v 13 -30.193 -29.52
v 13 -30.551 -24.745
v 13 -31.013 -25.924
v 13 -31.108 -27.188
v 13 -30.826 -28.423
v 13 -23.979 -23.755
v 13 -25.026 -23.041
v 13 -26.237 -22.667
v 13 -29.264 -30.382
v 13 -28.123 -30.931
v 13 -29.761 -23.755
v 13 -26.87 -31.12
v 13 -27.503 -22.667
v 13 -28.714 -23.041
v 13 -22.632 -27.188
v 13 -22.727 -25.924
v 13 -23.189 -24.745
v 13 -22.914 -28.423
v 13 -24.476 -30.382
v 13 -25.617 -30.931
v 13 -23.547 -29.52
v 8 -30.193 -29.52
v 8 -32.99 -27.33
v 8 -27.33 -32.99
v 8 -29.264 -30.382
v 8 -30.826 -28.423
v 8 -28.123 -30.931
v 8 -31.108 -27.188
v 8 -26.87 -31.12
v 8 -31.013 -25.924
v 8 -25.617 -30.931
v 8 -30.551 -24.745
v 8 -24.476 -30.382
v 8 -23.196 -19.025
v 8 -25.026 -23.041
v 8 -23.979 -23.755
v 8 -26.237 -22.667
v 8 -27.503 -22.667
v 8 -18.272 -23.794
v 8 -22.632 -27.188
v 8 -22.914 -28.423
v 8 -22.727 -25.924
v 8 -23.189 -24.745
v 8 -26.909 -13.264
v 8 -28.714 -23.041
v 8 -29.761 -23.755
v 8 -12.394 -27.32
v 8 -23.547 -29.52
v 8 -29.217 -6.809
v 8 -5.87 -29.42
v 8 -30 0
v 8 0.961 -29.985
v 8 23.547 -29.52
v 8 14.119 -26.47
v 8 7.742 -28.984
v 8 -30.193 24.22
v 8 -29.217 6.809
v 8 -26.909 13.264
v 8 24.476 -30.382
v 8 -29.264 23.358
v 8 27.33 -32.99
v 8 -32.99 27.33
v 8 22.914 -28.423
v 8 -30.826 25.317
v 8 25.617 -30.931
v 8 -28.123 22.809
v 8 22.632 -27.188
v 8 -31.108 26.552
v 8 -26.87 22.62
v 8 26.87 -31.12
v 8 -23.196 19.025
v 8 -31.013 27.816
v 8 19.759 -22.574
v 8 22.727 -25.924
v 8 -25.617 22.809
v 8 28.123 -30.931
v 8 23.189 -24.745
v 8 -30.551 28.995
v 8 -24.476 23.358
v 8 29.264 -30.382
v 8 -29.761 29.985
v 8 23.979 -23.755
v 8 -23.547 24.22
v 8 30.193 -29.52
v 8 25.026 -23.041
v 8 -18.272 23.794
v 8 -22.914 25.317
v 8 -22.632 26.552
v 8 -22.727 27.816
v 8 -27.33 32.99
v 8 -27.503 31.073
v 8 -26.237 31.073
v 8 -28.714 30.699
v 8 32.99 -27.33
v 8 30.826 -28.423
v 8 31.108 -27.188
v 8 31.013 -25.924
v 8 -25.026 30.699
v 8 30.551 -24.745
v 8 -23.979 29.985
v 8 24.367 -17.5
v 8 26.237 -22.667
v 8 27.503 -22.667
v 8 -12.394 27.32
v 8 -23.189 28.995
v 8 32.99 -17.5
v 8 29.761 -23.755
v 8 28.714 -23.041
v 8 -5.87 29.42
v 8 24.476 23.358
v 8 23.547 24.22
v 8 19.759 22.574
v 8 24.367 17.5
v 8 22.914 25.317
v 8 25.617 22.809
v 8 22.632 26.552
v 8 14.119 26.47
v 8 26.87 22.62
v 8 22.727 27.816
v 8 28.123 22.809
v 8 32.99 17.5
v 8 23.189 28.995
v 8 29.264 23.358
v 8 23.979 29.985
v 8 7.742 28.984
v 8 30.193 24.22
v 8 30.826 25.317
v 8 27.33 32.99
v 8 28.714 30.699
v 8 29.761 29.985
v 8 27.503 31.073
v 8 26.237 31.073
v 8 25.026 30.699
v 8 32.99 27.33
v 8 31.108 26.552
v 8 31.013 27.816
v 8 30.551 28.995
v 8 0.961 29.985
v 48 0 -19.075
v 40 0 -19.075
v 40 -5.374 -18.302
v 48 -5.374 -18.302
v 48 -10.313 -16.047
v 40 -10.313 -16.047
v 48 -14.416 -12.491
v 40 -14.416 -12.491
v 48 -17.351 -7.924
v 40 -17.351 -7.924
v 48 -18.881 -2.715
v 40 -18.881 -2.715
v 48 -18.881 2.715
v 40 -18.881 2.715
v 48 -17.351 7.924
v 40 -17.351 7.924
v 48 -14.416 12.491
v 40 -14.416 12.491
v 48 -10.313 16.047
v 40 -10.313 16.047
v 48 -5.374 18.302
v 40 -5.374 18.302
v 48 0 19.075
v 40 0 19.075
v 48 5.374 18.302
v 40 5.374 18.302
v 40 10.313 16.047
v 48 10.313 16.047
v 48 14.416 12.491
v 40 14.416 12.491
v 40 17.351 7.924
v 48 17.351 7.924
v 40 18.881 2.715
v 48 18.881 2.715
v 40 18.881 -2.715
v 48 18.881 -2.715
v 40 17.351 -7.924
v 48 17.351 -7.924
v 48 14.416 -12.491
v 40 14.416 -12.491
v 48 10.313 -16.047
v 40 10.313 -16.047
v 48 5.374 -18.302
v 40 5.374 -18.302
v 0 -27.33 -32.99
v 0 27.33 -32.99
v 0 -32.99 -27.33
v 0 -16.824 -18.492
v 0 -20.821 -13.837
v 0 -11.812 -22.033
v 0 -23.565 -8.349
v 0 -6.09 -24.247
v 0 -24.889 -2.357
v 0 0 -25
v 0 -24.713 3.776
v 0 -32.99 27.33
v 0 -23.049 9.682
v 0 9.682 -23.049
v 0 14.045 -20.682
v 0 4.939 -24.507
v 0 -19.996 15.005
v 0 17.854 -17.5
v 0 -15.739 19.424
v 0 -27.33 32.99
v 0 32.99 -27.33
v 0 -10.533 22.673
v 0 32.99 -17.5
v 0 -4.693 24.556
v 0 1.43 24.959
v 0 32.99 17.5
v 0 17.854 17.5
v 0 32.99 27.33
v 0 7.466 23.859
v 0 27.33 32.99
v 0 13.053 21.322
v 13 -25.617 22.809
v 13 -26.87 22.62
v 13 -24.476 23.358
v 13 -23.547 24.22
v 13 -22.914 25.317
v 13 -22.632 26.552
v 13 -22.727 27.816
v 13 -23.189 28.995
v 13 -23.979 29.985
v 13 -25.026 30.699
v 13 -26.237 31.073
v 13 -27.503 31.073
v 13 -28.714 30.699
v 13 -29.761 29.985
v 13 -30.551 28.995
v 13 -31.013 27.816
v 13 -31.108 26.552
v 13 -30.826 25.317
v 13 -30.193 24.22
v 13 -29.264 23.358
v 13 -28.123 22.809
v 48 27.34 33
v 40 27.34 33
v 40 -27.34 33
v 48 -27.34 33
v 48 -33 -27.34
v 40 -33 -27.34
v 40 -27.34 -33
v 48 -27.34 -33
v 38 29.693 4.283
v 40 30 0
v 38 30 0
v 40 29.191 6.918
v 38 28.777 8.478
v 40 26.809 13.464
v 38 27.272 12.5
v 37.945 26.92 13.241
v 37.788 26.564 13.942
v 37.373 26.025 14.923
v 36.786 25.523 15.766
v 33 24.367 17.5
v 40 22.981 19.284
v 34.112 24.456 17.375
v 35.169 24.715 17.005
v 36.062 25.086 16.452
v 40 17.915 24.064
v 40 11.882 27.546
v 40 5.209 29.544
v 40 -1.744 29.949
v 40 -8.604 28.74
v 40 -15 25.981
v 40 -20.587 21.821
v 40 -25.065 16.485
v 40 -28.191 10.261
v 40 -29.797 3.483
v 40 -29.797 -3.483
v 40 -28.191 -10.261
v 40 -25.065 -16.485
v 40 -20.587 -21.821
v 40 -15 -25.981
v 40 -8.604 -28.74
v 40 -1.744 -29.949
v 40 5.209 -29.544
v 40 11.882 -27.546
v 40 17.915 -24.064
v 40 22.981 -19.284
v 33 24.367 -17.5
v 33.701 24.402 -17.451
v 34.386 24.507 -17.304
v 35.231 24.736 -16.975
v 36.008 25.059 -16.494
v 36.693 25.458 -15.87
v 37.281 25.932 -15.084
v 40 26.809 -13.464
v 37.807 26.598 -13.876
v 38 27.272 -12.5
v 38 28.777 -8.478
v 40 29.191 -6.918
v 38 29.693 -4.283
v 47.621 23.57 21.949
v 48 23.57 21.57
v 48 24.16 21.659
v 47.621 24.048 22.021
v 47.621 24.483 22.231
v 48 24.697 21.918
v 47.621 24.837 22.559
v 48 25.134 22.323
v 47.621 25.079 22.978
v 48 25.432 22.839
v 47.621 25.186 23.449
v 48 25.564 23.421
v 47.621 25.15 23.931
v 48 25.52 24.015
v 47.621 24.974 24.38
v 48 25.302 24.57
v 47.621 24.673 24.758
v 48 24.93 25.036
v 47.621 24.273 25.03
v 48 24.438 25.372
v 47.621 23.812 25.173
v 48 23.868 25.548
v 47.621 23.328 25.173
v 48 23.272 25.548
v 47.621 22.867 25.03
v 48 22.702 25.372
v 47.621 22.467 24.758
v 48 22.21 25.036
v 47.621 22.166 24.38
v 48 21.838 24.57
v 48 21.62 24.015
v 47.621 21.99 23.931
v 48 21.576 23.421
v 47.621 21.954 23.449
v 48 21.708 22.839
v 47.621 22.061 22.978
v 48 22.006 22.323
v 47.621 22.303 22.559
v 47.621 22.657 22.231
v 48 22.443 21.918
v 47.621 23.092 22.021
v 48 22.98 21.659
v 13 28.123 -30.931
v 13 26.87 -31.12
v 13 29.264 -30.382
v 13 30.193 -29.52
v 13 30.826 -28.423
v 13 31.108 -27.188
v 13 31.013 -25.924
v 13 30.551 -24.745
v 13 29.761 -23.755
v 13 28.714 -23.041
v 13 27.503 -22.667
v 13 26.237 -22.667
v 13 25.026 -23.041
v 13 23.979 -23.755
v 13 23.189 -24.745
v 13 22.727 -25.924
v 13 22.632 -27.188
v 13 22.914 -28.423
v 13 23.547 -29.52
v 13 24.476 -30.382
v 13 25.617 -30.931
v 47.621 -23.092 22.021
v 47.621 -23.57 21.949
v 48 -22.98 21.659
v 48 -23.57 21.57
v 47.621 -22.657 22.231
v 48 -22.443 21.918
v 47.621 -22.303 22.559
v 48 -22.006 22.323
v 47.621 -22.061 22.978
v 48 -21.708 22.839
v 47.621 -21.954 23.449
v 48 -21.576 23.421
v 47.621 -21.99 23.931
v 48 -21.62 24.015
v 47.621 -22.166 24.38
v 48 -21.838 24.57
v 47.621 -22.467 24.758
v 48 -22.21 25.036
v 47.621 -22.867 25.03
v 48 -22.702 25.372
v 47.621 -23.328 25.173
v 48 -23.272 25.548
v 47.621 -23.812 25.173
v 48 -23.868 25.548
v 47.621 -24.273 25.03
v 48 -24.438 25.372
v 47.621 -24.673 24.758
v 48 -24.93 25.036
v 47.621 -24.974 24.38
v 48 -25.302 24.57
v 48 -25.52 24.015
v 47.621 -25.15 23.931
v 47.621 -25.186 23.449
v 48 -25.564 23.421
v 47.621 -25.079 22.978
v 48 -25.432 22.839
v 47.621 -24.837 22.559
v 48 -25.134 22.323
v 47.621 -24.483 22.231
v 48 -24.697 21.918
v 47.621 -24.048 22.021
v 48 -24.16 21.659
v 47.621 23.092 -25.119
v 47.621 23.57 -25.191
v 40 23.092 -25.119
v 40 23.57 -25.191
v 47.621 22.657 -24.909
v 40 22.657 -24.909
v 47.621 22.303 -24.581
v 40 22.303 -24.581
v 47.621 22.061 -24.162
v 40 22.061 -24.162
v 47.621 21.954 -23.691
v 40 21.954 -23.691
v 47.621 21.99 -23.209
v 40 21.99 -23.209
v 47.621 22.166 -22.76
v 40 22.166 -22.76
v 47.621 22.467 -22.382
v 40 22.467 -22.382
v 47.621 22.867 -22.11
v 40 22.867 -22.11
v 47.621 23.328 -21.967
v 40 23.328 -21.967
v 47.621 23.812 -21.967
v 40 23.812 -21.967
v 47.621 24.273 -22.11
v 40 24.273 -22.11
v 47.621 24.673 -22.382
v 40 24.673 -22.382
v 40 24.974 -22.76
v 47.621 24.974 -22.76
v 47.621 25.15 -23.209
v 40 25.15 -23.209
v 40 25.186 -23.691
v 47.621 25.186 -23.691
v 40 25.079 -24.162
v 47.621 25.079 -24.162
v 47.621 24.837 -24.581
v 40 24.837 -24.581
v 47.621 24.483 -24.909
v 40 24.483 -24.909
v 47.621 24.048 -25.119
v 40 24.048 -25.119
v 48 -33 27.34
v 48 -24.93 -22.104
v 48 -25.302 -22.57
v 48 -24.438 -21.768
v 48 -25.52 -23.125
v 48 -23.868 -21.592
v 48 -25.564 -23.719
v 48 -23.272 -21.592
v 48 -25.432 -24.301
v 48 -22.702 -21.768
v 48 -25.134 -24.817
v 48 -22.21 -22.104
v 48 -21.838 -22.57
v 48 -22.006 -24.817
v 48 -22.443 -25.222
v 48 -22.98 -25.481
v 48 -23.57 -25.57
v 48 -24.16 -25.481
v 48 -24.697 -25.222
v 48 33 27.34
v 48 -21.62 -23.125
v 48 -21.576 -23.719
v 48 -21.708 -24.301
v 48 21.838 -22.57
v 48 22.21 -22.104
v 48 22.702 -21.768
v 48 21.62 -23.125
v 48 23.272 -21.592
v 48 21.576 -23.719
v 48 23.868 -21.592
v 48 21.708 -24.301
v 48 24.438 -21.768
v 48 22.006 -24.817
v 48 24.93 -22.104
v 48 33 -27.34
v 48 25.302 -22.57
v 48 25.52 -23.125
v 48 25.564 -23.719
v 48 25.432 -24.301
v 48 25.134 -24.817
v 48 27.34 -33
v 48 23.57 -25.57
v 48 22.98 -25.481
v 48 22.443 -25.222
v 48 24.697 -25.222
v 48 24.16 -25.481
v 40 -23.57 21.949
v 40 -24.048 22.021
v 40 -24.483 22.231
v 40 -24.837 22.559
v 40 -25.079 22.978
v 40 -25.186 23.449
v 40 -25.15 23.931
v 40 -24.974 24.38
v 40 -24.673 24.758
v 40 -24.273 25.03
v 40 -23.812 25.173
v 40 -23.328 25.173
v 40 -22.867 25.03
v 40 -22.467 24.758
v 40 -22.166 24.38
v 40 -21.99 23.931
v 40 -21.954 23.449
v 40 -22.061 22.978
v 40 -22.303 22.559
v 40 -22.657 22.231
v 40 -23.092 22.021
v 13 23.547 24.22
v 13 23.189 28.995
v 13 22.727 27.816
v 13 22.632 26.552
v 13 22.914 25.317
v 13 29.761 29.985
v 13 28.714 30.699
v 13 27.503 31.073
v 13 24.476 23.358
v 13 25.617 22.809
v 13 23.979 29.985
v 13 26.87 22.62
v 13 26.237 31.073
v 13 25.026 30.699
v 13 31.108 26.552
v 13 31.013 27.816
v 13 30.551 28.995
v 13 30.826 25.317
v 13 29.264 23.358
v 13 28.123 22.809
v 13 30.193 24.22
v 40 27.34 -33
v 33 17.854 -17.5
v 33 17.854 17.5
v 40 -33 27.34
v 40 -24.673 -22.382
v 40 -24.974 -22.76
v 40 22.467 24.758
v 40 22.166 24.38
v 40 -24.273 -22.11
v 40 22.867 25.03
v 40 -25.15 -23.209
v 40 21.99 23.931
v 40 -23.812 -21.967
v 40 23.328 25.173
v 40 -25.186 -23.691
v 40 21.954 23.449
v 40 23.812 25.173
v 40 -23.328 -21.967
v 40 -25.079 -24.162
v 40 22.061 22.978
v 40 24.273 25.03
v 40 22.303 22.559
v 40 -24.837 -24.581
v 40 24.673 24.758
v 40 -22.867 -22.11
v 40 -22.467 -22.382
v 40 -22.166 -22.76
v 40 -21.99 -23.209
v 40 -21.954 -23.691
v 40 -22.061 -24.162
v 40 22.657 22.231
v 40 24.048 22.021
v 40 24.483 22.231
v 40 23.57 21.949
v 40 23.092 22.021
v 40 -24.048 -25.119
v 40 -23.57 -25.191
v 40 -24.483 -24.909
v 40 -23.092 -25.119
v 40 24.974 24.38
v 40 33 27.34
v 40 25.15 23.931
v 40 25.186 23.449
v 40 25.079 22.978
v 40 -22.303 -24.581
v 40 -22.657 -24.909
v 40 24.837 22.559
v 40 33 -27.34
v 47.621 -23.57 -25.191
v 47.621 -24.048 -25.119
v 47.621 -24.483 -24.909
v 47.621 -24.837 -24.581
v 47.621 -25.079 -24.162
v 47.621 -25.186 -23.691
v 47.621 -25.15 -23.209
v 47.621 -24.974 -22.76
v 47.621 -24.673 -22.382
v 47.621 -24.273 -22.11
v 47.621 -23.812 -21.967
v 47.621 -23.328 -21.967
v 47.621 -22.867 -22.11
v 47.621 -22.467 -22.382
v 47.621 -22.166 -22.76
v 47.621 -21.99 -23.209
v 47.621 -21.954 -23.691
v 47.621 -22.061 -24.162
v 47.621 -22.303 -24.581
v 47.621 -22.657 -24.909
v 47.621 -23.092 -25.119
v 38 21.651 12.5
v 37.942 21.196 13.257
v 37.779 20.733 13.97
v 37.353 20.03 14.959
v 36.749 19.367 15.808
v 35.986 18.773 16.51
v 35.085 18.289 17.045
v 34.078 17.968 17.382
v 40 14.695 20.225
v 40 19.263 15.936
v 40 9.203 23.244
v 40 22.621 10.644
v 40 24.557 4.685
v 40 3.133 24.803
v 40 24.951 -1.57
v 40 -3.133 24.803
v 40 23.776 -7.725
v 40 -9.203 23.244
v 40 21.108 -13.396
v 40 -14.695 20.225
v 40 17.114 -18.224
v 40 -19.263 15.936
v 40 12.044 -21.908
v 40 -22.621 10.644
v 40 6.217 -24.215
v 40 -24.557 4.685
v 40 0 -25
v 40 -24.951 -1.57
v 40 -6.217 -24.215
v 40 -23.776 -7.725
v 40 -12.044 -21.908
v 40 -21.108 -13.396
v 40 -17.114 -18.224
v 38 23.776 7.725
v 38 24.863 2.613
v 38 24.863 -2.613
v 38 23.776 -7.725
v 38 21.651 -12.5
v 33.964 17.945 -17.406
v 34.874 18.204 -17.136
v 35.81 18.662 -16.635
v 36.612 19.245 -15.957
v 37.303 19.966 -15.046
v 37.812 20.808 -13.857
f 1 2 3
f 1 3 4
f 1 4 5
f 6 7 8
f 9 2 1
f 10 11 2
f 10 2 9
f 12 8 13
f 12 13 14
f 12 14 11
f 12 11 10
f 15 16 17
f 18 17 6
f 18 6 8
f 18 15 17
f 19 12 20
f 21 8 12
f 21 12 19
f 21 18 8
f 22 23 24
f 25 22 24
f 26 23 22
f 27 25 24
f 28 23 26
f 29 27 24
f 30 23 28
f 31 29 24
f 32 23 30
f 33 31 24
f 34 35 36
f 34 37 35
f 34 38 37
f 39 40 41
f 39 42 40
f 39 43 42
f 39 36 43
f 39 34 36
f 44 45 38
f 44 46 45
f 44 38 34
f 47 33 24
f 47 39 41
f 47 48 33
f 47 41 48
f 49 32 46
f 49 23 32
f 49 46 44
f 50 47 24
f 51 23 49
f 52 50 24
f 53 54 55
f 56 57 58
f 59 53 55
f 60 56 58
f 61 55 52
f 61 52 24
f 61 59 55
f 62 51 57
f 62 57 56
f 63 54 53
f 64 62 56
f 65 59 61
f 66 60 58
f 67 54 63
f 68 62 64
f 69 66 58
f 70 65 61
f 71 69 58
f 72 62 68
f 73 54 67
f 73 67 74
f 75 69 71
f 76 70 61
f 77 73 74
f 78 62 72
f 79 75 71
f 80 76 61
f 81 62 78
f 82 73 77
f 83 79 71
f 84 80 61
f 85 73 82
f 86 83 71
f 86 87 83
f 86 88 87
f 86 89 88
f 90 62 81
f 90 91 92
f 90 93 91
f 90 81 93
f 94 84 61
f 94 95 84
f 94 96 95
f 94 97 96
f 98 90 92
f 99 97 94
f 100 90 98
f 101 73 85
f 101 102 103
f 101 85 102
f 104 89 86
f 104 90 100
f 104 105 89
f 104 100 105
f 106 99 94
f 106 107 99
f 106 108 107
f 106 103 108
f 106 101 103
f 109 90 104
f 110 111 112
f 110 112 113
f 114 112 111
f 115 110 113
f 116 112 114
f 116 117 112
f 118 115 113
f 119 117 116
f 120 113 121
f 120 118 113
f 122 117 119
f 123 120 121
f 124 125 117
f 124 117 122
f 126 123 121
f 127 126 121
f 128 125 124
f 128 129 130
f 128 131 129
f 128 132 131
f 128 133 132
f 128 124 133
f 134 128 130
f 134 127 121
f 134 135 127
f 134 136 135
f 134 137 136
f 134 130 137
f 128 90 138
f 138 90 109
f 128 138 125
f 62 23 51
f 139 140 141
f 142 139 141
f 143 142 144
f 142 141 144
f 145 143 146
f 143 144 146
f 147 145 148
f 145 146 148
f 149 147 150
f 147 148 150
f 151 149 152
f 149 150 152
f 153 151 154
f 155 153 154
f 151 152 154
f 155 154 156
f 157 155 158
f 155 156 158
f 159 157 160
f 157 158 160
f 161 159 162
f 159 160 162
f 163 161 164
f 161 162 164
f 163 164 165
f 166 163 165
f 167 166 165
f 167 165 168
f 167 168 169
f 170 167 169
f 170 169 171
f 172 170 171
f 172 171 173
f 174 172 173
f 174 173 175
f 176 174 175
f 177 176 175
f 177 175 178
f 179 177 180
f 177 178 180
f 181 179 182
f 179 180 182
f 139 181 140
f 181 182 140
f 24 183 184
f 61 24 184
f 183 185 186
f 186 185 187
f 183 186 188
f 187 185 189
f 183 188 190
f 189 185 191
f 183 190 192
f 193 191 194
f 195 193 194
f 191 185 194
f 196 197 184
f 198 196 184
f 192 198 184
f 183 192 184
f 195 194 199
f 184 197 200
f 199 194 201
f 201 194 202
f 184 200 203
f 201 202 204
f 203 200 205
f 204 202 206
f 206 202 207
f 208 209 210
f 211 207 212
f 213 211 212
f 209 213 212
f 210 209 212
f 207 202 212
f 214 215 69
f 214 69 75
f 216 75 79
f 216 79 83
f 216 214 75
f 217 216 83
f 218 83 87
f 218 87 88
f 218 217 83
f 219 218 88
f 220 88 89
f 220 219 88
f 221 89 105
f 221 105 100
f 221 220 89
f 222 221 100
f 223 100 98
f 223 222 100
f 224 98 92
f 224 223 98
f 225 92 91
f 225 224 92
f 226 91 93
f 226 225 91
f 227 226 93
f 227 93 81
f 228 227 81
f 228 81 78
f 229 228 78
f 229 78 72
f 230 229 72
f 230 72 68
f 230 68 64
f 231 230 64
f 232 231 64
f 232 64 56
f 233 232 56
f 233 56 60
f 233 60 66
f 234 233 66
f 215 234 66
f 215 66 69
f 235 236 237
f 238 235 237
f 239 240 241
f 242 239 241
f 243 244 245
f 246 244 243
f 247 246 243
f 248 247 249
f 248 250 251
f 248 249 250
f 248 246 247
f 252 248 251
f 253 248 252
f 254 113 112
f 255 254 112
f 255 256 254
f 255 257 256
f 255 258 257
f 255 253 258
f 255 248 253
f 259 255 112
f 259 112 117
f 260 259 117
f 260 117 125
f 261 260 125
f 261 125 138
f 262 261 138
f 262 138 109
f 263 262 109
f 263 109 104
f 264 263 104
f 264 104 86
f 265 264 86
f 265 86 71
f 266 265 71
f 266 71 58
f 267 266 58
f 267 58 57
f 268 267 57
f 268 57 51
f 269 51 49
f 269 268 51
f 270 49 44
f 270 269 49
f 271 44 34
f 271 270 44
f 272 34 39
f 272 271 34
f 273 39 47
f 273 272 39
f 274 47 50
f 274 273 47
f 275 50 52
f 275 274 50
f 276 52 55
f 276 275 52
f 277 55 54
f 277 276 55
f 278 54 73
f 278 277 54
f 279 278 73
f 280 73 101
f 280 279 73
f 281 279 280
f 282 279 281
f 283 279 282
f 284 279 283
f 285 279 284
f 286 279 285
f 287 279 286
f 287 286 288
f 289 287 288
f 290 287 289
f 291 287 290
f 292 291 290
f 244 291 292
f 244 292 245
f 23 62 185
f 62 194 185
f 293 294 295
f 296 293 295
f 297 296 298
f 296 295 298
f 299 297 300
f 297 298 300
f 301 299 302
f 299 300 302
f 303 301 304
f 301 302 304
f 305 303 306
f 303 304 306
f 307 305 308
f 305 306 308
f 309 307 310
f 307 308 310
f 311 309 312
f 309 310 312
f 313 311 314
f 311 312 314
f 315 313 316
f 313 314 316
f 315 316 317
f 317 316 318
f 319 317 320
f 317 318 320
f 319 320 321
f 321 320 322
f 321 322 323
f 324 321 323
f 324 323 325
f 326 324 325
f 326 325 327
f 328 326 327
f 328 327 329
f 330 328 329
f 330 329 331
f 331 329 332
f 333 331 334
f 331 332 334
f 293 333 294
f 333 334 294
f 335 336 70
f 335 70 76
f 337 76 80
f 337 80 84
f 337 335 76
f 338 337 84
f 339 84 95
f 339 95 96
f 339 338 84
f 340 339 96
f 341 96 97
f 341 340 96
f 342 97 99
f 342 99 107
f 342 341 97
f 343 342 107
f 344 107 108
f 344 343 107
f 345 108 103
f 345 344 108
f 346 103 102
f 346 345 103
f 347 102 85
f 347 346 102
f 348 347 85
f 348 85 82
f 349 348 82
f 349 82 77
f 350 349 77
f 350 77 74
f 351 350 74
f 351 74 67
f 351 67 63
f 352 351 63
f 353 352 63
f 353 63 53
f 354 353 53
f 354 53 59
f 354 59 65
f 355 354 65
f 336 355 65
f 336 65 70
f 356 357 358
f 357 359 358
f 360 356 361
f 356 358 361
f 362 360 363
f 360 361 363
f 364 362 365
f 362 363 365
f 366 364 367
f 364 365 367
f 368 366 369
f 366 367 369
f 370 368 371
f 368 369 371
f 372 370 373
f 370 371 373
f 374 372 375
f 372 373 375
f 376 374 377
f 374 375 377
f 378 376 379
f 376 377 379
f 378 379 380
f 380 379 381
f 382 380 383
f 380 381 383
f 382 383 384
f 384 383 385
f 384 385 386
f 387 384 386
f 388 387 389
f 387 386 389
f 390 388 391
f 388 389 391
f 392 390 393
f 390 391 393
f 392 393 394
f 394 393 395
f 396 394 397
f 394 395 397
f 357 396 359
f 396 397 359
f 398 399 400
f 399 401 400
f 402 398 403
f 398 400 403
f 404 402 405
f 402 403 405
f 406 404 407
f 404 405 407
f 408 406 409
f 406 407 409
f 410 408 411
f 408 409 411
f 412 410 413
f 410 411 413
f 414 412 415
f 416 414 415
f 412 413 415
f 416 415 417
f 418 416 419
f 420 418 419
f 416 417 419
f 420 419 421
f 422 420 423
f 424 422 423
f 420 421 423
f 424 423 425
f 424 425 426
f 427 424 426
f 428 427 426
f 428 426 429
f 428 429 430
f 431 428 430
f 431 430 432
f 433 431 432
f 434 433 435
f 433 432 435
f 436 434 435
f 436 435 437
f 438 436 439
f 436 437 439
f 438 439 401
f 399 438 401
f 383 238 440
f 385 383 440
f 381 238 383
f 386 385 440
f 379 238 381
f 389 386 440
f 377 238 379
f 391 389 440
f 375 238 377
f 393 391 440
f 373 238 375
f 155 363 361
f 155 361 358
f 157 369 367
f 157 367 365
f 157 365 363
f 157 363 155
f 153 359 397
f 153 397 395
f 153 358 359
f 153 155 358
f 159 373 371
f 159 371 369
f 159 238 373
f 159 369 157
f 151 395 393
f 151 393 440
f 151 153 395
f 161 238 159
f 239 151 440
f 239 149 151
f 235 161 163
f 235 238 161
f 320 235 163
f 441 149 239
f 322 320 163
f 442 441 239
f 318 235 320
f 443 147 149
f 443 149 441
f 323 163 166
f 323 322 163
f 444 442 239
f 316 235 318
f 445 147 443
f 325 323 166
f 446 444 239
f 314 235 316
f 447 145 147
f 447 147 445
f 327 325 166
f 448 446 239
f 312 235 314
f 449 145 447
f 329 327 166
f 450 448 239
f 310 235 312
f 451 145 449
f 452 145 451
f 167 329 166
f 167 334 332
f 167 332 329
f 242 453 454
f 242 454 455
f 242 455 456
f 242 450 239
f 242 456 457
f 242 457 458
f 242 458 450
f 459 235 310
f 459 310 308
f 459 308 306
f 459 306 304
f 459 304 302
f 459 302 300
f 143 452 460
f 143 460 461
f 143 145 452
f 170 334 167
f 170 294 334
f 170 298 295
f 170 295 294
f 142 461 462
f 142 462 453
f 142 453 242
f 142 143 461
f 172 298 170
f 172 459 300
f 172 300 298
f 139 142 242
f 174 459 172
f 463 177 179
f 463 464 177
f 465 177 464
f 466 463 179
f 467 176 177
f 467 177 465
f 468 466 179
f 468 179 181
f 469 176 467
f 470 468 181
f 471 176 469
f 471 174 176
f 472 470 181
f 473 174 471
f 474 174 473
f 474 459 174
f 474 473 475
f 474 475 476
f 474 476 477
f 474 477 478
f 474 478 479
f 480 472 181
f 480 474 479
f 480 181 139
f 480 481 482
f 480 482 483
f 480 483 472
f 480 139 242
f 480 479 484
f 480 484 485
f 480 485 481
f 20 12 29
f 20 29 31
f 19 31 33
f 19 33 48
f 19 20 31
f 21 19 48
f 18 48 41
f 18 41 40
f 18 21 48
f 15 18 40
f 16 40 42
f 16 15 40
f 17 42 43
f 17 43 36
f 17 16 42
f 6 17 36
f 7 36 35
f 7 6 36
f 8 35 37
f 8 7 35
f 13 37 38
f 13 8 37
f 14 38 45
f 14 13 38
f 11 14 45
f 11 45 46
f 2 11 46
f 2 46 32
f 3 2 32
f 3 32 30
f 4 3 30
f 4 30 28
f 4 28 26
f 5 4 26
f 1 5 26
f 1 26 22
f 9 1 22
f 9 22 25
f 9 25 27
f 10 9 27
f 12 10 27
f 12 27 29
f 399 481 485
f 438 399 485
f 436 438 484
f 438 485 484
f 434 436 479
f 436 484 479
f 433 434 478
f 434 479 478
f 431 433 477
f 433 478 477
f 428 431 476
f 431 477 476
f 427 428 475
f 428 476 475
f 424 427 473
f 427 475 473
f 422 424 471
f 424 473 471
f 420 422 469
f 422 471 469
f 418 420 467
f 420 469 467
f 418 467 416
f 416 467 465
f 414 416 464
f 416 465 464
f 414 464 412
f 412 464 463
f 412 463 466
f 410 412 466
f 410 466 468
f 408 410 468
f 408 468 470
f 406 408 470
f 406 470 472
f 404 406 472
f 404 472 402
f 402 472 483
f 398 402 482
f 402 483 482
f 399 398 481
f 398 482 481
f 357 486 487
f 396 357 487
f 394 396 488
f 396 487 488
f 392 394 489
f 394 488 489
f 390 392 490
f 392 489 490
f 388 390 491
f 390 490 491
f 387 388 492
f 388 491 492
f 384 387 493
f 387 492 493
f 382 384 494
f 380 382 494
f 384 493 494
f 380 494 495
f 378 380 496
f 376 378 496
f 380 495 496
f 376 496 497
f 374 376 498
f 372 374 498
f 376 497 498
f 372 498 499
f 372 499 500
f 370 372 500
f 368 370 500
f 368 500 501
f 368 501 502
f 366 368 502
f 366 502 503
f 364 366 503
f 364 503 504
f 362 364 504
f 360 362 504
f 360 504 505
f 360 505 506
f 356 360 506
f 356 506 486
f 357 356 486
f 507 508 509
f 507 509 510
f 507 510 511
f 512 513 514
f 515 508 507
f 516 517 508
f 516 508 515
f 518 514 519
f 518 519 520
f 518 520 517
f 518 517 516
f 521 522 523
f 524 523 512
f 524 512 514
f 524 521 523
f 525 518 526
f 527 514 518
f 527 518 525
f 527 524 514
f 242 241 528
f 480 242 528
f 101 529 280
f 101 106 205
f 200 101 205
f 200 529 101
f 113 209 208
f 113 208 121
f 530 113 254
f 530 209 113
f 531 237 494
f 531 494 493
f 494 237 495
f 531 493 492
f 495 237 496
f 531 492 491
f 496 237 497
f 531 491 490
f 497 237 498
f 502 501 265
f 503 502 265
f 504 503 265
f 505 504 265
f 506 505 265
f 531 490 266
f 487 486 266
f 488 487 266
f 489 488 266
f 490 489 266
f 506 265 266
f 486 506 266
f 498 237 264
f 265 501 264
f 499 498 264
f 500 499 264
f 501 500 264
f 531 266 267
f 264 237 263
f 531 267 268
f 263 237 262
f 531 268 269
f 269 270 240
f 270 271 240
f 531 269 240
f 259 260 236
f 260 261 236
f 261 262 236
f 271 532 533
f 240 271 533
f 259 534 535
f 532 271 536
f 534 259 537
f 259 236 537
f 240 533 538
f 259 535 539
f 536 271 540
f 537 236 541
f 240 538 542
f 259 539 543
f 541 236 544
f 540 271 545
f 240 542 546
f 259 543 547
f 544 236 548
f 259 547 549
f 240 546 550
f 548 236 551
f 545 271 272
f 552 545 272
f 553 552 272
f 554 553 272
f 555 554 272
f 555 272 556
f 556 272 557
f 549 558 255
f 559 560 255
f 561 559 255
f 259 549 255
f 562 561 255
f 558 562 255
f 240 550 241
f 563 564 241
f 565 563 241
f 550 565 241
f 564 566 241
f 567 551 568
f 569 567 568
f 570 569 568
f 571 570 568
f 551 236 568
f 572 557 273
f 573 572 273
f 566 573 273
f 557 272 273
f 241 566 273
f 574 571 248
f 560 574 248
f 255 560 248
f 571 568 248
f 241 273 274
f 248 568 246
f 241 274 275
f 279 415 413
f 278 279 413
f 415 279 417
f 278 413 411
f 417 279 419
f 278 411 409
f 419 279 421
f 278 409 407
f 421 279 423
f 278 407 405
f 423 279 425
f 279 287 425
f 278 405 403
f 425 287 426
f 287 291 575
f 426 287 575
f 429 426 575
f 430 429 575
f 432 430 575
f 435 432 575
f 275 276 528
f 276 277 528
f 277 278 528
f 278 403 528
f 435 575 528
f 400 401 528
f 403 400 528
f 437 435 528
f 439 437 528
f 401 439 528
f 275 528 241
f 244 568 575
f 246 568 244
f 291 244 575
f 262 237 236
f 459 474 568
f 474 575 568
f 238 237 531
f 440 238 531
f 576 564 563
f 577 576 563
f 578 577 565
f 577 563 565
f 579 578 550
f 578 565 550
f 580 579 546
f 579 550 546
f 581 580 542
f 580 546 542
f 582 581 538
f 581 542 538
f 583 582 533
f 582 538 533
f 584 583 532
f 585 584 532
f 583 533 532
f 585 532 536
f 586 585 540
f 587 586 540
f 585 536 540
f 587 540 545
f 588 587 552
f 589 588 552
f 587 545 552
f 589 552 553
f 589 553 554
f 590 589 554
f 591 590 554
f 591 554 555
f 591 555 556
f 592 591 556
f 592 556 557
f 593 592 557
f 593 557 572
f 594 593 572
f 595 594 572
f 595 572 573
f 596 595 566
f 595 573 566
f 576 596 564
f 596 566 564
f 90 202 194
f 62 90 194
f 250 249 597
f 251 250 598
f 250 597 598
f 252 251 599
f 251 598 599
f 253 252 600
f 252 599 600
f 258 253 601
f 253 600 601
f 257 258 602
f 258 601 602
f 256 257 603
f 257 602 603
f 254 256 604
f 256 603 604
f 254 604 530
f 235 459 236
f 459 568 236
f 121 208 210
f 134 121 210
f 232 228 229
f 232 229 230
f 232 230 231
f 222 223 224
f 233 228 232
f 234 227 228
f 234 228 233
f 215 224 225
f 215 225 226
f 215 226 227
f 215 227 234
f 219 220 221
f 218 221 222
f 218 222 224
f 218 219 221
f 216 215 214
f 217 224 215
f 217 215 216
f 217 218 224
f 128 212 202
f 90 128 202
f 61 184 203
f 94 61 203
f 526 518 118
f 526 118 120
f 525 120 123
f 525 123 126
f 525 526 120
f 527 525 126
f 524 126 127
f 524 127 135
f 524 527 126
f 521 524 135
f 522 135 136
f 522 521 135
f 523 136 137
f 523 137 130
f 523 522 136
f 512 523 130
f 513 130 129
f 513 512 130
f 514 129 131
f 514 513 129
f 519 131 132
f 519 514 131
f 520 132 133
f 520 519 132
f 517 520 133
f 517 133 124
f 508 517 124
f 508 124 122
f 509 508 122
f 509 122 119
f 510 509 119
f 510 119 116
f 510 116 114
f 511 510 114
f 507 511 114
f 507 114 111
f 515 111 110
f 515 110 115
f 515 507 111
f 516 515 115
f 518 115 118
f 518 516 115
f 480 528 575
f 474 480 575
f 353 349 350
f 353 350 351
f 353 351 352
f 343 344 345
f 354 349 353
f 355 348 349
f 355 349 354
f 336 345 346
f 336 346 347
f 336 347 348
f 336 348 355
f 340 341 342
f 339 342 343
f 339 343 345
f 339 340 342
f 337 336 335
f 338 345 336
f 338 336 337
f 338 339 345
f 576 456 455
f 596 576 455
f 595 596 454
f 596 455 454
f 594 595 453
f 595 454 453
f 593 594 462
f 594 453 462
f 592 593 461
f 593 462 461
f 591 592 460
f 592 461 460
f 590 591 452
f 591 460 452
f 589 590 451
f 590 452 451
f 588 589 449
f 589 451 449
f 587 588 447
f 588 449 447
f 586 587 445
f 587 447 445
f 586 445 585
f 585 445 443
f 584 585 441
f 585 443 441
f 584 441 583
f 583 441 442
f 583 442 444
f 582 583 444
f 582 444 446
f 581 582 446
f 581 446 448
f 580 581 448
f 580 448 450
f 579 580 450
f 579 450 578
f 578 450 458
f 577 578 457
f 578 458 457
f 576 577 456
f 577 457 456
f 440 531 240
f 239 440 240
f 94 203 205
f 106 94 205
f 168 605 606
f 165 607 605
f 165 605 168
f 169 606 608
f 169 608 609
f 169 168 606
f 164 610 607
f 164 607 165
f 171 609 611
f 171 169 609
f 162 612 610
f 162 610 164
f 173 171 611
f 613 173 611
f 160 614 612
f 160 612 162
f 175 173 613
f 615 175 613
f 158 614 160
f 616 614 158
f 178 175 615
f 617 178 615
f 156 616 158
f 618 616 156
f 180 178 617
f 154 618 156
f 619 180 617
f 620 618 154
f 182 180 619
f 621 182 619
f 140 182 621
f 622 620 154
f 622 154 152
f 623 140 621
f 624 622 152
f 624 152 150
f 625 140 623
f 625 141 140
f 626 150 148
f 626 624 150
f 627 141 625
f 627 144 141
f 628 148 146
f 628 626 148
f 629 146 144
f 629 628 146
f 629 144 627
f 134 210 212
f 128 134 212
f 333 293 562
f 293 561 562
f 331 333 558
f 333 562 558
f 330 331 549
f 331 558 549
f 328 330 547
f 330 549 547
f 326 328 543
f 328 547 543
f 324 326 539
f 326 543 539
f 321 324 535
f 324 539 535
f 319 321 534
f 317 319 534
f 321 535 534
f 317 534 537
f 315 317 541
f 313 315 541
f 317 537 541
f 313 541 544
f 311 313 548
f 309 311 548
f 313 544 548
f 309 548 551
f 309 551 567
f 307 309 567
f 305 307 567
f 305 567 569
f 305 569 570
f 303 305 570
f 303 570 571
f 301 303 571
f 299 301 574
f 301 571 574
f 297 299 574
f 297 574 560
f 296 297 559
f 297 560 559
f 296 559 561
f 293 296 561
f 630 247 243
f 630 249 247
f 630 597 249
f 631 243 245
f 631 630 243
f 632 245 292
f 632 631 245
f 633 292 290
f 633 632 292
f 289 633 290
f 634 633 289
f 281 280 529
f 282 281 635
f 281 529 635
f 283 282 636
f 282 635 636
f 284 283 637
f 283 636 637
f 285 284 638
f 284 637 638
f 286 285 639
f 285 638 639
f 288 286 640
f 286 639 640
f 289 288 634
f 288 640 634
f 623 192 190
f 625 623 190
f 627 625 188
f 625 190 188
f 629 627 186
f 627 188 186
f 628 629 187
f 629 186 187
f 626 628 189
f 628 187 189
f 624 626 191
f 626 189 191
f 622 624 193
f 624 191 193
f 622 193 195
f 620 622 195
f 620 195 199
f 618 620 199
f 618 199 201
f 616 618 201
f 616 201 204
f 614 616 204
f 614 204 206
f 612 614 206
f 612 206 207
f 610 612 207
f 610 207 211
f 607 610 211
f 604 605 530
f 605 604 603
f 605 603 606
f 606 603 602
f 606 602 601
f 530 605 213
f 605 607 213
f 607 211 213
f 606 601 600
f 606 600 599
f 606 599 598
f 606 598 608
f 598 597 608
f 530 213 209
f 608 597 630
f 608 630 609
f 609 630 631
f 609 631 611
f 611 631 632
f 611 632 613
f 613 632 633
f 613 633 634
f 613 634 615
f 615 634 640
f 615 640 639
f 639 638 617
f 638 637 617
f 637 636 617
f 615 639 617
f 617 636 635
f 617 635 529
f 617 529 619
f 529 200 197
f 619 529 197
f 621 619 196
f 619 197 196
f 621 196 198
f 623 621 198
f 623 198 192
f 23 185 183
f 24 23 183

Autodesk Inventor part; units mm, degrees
sketch "Sketch_1" plane through (0, 0, 0) normal (1, 0, 0) x (0, 1, 0)
  line L0 (27.33, 32.99) -> (-27.33, 32.99)
  line L1 (-27.33, 32.99) -> (-32.99, 27.33)
  line L2 (-32.99, 27.33) -> (-32.99, -27.33)
  line L3 (-32.99, -27.33) -> (-27.33, -32.99)
  line L4 (-27.33, -32.99) -> (27.33, -32.99)
  line L5 (27.33, -32.99) -> (32.99, -27.33)
  line L6 (32.99, -27.33) -> (32.99, 27.33)
  line L7 (32.99, 27.33) -> (27.33, 32.99)
extrude "Extrusion1" add sketch "Sketch_1" along normal blind 8
sketch "Sketch_2" plane through (0, 0, 0) normal (0, 0, 1) x (1, 0, 0)
  line L0 (40, 0) -> (8, 0)
  line L1 (8, 0) -> (8, 30)
  line L2 (8, 30) -> (40, 30)
  line L3 (40, 30) -> (40, 0)
  line L4 (40, 0) -> (8, 0)
revolve "Revolution1" add sketch "Sketch_2" angle 360 about axis through (40, 0, 0) along (1, 0, 0)
sketch "Sketch_3" plane through (40, 0, 0) normal (1, 0, 0) x (0, 0, -1)
  line L0 (-33, 27.34) -> (-33, -27.34)
  line L1 (-33, -27.34) -> (-27.34, -33)
  line L2 (-27.34, -33) -> (27.34, -33)
  line L3 (27.34, -33) -> (33, -27.34)
  line L4 (33, -27.34) -> (33, 27.34)
  line L5 (33, 27.34) -> (27.34, 33)
  line L6 (27.34, 33) -> (-27.34, 33)
  line L7 (-27.34, 33) -> (-33, 27.34)
extrude "Extrusion2" add sketch "Sketch_3" along normal blind 8
sketch "Sketch4" plane through (48, 0, 0) normal (1, 0, 0) x (0, 0, -1)
  point P0 (0, 0)
hole "Drilling 1" at (48, 0, 0) direction (-1, 0, 0) diameter 38.15 depth 8
sketch "Sketch5" plane through (40, 0, 0) normal (1, 0, 0) x (0, 0, -1)
  point P0 (0, 0)
hole "Drilling 2" at (40, 0, 0) direction (-1, 0, 0) diameter 50 depth 40
sketch "Sketch_7" plane through (0, 26.87, 0) normal (0, 1, 0) x (1, 0, 0)
  line L0 (13, 26.87) -> (8, 26.87)
  line L1 (8, 26.87) -> (8, 31.12)
  line L2 (8, 31.12) -> (13, 31.12)
  line L3 (13, 31.12) -> (13, 26.87)
  line L4 (13, 26.87) -> (8, 26.87)
revolve "Revolution2" add sketch "Sketch_7" angle 360 about axis through (13, 26.87, -26.87) along (1, 0, 0)
sketch "Sketch_8" plane through (0, 26.87, 0) normal (0, 1, 0) x (1, 0, 0)
  line L0 (13, -26.87) -> (8, -26.87)
  line L1 (8, -26.87) -> (8, -22.62)
  line L2 (8, -22.62) -> (13, -22.62)
  line L3 (13, -22.62) -> (13, -26.87)
  line L4 (13, -26.87) -> (8, -26.87)
revolve "Revolution3" add sketch "Sketch_8" angle 360 about axis through (13, 26.87, 26.87) along (1, 0, 0)
sketch "Sketch8" plane through (48, 0, 0) normal (1, 0, 0) x (0, 0, -1)
  point P0 (-23.57, 23.57)
hole "Drilling 3" at (48, 23.57, 23.57) direction (-1, 0, 0) diameter 3.242 depth 8 countersink diameter 4 countersink angle 90 thread size "M4x0.7" class "6H" standard "ISO Metric profile"
sketch "Sketch9" plane through (48, 0, 0) normal (1, 0, 0) x (0, 0, -1)
  point P0 (-23.57, -23.57)
hole "Drilling 4" at (48, -23.57, 23.57) direction (-1, 0, 0) diameter 3.242 depth 8 countersink diameter 4 countersink angle 90 thread size "M4x0.7" class "6H" standard "ISO Metric profile"
sketch "Sketch10" plane through (48, 0, 0) normal (1, 0, 0) x (0, 0, -1)
  point P0 (23.57, 23.57)
hole "Drilling 5" at (48, 23.57, -23.57) direction (-1, 0, 0) diameter 3.242 depth 8 countersink diameter 4 countersink angle 90 thread size "M4x0.7" class "6H" standard "ISO Metric profile"
sketch "Sketch11" plane through (48, 0, 0) normal (1, 0, 0) x (0, 0, -1)
  point P0 (23.57, -23.57)
hole "Drilling 6" at (48, -23.57, -23.57) direction (-1, 0, 0) diameter 3.242 depth 8 countersink diameter 4 countersink angle 90 thread size "M4x0.7" class "6H" standard "ISO Metric profile"
sketch "Sketch_9" plane through (0, -26.87, 0) normal (0, 1, 0) x (1, 0, 0)
  line L0 (13, 26.87) -> (8, 26.87)
  line L1 (8, 26.87) -> (8, 31.12)
  line L2 (8, 31.12) -> (13, 31.12)
  line L3 (13, 31.12) -> (13, 26.87)
  line L4 (13, 26.87) -> (8, 26.87)
revolve "Revolution4" add sketch "Sketch_9" angle 360 about axis through (13, -26.87, -26.87) along (1, 0, 0)
sketch "Sketch_10" plane through (0, -26.87, 0) normal (0, 1, 0) x (1, 0, 0)
  line L0 (13, -26.87) -> (8, -26.87)
  line L1 (8, -26.87) -> (8, -22.62)
  line L2 (8, -22.62) -> (13, -22.62)
  line L3 (13, -22.62) -> (13, -26.87)
  line L4 (13, -26.87) -> (8, -26.87)
revolve "Revolution5" add sketch "Sketch_10" angle 360 about axis through (13, -26.87, 26.87) along (1, 0, 0)
sketch "Sketch_33" plane through (0, 0, 0) normal (0, 1, 0) x (-1, 0, 0)
  line L0 (0, -17.5) -> (0, 17.5)
  line L1 (0, 17.5) -> (-33, 17.5)
  arc A0 (-33, 17.5) -> (-38, 12.5) centre (-33, 12.5) ccw
  line L2 (-38, 12.5) -> (-38, -12.5)
  arc A1 (-38, -12.5) -> (-33, -17.5) centre (-33, -12.5) ccw
  line L3 (-33, -17.5) -> (0, -17.5)
extrude "Extrusion3" cut sketch "Sketch_33" along normal blind 33
ref_plane "type_gl_n_bm_XY" through (0, 0, 0) normal (1, 0, 0) x (0, -1, 0)
ref_plane "type_gl_n_bm_YZ" through (0, 0, 0) normal (0, -1, 0) x (0, 0, -1)
ref_plane "type_gl_n_bm_ZX" through (0, 0, 0) normal (0, 0, -1) x (1, 0, 0)
properties part number "GL20NU1 Y Motor bracket"
